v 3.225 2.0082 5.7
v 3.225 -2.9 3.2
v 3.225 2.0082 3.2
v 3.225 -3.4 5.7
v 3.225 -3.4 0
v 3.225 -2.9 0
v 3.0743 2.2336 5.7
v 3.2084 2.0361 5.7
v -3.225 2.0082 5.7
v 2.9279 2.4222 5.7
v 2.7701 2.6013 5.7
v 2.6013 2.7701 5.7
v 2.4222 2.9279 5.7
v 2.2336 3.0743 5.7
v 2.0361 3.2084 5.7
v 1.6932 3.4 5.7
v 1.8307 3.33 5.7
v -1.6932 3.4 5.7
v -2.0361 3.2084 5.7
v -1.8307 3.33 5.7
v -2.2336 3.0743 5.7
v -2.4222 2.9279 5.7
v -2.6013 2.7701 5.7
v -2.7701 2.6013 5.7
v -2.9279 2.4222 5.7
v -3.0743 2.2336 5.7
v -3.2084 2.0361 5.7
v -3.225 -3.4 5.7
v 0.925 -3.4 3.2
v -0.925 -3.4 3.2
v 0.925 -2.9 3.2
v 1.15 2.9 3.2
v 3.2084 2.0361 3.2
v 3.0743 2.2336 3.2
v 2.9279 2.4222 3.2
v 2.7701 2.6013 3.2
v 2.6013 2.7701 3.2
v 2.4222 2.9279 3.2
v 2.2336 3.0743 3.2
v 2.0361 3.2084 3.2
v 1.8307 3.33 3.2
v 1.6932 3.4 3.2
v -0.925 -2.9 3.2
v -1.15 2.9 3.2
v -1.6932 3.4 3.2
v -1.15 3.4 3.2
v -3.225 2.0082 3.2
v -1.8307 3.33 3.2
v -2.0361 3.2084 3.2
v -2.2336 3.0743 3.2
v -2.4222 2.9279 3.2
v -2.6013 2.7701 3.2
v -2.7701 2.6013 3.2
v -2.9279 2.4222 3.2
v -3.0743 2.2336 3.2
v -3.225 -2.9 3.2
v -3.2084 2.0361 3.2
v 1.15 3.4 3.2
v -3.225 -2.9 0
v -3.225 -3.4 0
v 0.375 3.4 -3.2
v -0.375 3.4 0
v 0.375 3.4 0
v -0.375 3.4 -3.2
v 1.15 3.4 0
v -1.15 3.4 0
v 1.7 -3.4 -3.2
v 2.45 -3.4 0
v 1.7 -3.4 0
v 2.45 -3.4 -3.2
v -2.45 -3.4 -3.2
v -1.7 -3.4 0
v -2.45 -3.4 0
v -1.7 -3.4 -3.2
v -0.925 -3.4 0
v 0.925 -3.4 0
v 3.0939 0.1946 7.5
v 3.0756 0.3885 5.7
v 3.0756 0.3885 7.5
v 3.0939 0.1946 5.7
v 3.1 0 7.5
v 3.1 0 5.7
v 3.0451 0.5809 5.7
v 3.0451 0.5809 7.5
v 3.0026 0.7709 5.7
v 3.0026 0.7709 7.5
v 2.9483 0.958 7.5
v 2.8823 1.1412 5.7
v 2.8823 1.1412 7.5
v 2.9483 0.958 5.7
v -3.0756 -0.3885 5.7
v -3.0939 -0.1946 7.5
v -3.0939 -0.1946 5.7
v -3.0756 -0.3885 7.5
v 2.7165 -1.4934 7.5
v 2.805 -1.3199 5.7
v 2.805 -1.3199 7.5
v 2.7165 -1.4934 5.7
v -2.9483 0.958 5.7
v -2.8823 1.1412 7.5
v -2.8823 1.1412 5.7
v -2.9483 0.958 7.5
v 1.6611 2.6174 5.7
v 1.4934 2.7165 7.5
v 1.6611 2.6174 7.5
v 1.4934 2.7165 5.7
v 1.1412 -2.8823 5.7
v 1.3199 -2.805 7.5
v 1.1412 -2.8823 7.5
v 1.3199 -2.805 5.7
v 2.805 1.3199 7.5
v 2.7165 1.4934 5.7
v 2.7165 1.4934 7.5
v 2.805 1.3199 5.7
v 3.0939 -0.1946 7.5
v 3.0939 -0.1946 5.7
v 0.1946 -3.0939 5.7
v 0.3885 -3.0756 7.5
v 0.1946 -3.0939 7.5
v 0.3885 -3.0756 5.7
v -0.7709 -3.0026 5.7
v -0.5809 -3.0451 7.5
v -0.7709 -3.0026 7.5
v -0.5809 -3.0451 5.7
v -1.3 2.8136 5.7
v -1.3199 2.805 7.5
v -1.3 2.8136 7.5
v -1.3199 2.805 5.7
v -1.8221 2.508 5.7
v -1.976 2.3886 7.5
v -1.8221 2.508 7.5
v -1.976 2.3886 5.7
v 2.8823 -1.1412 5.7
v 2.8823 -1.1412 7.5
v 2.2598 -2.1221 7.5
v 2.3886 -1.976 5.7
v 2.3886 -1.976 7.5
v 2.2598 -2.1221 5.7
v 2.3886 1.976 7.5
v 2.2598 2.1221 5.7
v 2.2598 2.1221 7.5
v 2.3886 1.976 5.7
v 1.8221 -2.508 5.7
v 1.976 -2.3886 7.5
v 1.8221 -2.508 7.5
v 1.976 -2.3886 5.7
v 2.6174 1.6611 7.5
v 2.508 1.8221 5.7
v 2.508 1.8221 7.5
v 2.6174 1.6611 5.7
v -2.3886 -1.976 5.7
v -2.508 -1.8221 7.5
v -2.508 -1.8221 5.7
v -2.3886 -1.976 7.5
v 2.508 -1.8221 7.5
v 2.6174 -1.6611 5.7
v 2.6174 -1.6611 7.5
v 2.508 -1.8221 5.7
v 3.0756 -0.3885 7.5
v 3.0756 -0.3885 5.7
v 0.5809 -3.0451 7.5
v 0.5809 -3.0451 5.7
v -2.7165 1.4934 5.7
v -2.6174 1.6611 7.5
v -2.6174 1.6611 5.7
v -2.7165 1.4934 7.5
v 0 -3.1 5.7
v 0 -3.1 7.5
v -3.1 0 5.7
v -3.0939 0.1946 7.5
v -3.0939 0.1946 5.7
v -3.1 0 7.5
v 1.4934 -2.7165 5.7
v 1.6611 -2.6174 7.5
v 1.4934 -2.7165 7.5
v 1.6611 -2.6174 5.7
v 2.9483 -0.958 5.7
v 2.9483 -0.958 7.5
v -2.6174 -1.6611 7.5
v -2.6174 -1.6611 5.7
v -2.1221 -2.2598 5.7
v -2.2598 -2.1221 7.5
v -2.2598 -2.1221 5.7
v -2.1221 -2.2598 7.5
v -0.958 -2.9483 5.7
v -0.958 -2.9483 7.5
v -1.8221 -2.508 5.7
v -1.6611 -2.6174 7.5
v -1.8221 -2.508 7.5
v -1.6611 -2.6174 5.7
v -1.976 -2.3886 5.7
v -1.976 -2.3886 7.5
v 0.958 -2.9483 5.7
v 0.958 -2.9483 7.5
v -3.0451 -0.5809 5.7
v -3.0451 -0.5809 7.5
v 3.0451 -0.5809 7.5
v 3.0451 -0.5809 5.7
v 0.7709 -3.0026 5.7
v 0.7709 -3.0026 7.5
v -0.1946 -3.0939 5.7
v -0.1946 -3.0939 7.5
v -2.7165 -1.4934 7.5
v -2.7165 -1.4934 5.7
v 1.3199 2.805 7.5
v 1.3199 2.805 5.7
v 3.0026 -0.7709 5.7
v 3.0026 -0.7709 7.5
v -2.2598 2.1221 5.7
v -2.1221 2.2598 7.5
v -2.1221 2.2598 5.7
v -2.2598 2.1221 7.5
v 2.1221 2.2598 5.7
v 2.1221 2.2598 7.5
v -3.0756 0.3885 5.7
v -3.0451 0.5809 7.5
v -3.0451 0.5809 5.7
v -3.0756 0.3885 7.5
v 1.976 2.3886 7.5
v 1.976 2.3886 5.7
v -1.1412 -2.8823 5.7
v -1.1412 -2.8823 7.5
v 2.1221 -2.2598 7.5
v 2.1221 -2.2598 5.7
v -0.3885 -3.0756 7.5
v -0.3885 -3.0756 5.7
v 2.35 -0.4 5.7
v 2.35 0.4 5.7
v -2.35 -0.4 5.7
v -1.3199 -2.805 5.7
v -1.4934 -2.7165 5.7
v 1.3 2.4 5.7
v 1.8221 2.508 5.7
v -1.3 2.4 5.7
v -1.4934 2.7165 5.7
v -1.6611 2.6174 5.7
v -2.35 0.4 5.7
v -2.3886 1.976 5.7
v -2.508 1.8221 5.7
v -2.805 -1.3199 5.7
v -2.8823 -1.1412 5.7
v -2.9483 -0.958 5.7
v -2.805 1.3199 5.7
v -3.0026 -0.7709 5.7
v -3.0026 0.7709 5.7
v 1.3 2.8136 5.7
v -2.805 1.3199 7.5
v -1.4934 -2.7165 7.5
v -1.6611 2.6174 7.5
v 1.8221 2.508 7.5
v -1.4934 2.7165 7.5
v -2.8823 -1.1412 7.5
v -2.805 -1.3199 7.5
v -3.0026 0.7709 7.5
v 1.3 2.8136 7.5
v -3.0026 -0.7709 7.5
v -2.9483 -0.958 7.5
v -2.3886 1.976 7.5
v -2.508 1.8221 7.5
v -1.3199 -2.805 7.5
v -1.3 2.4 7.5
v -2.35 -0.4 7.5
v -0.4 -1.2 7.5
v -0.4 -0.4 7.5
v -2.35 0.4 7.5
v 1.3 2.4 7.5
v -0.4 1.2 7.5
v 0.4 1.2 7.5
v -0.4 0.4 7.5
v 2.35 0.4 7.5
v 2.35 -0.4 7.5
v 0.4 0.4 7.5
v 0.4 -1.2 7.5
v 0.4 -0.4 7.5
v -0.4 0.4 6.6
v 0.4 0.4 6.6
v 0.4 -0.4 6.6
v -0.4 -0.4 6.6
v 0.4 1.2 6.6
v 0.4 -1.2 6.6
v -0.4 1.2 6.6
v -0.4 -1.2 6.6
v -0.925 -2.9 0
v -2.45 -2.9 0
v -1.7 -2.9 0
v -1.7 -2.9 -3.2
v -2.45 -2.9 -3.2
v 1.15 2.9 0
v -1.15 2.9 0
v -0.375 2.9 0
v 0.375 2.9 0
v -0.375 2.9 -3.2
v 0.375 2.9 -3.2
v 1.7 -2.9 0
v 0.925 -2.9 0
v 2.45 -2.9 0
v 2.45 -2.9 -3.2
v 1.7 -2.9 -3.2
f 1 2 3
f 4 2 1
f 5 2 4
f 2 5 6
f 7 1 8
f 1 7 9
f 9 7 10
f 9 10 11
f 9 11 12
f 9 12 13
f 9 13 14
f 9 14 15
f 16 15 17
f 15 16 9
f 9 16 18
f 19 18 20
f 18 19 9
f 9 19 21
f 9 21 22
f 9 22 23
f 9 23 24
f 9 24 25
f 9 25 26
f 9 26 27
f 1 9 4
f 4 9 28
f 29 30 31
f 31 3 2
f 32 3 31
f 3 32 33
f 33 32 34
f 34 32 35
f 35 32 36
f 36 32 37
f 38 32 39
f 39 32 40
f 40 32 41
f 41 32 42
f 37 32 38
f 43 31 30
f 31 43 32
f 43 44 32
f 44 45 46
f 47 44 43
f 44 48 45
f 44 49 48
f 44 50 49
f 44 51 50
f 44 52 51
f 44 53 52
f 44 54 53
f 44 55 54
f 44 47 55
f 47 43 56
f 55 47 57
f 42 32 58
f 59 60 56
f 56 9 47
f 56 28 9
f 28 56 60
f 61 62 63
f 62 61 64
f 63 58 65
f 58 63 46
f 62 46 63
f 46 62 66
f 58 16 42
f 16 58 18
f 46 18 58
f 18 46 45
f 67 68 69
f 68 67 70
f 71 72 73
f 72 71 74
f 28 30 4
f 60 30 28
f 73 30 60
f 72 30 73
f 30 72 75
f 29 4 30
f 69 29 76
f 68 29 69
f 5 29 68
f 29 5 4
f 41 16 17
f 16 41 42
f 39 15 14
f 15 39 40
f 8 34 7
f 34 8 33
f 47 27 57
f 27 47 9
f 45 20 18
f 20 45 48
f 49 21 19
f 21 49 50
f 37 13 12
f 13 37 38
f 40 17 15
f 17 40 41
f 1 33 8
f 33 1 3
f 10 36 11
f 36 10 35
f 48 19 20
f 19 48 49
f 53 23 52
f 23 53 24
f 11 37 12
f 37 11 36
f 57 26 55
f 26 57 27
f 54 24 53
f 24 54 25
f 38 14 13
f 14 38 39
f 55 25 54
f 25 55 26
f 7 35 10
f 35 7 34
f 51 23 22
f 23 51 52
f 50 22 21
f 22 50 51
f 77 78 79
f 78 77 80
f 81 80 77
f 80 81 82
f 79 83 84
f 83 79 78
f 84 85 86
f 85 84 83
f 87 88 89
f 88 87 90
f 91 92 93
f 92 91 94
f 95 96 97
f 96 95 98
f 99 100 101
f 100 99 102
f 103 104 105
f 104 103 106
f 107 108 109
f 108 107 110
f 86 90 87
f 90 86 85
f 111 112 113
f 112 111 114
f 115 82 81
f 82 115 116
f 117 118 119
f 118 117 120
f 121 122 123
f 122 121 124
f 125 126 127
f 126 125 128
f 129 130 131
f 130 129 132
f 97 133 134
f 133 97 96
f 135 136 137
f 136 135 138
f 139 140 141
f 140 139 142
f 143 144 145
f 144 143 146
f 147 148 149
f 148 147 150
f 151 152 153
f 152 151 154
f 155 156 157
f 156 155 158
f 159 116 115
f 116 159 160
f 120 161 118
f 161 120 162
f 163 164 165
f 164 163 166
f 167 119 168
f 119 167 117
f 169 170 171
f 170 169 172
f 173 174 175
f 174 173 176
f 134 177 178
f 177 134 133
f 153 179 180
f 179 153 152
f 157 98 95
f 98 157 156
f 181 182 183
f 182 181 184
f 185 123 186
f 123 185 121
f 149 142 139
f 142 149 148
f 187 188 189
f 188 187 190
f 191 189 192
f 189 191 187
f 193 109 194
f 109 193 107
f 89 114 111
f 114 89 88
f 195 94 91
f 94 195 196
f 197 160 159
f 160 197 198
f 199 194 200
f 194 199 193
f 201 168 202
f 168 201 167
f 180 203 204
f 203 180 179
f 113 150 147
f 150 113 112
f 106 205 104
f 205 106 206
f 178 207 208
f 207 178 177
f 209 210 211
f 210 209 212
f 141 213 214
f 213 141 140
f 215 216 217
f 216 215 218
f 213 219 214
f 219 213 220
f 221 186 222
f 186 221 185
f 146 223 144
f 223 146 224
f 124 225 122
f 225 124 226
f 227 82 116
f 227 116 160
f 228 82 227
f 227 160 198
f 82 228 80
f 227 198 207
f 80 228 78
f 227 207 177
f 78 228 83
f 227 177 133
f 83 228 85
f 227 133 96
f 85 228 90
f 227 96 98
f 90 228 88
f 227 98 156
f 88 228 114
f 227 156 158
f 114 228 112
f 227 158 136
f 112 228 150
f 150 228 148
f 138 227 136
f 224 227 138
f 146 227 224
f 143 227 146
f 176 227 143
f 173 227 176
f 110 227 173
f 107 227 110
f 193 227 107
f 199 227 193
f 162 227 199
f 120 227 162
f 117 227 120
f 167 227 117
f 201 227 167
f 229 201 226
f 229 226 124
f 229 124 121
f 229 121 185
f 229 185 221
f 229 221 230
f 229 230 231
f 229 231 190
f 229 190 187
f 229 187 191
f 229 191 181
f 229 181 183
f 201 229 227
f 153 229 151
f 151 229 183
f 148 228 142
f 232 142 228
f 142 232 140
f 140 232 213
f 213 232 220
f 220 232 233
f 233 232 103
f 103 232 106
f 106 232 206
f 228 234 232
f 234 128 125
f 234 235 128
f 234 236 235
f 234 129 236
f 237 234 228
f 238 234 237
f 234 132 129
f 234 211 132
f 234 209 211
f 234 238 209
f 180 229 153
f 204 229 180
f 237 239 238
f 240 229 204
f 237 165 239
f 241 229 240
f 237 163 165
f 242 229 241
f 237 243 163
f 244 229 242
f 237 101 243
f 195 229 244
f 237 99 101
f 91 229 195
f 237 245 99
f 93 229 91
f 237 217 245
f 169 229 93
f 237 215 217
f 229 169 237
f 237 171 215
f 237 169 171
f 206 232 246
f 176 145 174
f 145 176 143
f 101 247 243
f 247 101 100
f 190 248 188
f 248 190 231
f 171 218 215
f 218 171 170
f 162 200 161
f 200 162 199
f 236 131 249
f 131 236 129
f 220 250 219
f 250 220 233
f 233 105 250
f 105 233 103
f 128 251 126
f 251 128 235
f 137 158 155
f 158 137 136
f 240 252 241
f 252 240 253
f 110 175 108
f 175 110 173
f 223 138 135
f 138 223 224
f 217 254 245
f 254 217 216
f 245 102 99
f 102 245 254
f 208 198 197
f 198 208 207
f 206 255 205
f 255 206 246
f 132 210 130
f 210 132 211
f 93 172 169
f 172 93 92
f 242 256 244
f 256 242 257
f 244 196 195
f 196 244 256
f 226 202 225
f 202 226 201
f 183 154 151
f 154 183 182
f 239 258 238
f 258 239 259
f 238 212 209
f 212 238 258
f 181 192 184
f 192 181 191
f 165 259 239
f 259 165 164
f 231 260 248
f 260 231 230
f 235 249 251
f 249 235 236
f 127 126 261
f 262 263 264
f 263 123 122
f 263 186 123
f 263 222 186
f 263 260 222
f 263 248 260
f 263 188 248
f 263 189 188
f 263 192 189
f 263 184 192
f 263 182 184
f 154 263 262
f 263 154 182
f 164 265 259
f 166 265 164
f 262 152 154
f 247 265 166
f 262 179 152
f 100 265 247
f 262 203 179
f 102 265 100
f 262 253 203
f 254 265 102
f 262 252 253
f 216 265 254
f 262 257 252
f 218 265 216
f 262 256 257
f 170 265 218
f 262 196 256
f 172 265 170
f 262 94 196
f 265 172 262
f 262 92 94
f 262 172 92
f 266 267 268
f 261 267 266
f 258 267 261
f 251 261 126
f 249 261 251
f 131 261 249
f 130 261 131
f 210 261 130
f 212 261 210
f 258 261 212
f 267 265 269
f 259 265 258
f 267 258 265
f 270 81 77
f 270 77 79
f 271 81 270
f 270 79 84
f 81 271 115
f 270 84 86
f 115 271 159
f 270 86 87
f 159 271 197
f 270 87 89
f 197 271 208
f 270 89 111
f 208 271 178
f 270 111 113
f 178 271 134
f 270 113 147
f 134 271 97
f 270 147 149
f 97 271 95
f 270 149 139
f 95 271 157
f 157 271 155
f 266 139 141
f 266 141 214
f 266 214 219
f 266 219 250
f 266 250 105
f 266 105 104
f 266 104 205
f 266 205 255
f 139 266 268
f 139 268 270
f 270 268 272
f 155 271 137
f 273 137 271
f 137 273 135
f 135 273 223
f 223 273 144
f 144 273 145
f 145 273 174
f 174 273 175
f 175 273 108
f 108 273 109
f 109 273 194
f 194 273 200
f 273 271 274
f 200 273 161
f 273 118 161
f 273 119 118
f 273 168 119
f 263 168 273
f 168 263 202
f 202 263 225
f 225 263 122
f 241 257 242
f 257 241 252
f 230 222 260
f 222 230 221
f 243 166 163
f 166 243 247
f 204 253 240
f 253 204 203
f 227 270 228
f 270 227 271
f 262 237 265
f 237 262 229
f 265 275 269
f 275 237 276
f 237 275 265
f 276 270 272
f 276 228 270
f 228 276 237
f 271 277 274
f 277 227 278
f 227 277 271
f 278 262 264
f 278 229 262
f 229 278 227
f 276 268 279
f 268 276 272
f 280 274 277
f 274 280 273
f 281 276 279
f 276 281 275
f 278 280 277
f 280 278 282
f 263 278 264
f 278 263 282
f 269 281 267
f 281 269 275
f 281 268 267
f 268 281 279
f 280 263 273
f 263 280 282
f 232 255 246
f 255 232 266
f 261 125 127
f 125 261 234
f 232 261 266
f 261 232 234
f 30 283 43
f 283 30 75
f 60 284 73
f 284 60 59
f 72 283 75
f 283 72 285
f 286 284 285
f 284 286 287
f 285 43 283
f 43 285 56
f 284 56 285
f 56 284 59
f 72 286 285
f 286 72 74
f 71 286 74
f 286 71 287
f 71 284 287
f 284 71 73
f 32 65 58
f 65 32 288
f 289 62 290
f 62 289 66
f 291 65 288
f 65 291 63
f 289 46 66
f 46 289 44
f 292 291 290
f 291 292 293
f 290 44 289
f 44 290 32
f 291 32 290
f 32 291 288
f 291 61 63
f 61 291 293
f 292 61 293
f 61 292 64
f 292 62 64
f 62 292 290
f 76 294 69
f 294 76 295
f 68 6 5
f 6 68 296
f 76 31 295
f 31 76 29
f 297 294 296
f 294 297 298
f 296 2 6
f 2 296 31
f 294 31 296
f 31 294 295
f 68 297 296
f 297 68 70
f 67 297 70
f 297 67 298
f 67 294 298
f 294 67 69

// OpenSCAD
$fn = 100;

Body = [6.45, 6.8, 2.5];
Body_Cut_Diameter = 7.6;
Disk_Diameter = 6.2;
Disk_Height = 1.8;
Slit_Width = 0.8;
Slit_Length = 4.7;
Notch_Width = 2.6;
Notch_Depth = 1.0;
Pin_Thickness = 0.5;
Pin_Base_Height = 3.2;
Pin_Base_Width = 2.3;
Pin_Positions = [[-1, -1], [0, 1], [1, -1]];
Pin_Extent_Width = 0.75;
Pin_Extent_Height = 3.2;

e = 0.001;

Trimmer("#CCC", "#00F", "#999");

module Trimmer(disk_color, body_color, metal_color) {
  color(body_color) {
    intersection() {
      translate([-Body[0] / 2, -Body[1] / 2, Pin_Base_Height])
        cube(Body);
      translate([0, 0, Pin_Base_Height])
        cylinder(Body[2], d = Body_Cut_Diameter);
    }

    translate([-Body[0] / 2, -Body[1] / 2, Pin_Base_Height])
      cube([Body[0], Body[1] / 2, Body[2]]);
  }
  color(disk_color)
    translate([0, 0, Pin_Base_Height + Body[2]])
      difference() {
        cylinder(Disk_Height, d = Disk_Diameter);
        translate([-Slit_Length / 2, -Slit_Width / 2, -e / 2])
          cube([Slit_Length, Slit_Width, Disk_Height + e]);
        translate([-Slit_Width / 2, -Slit_Width * 1.5, Disk_Height / 2])
          cube([Slit_Width, Slit_Width * 3, Disk_Height / 2 + e]);
        translate([-Notch_Width / 2, Body[1] / 2 - Notch_Depth, -e / 2])
          cube([Notch_Width, Notch_Depth, Disk_Height + e]);
      }
  color(metal_color)
    for (pos = Pin_Positions) {
      translate([pos[0] * (Body[0] / 2 - Pin_Base_Width / 2),
                 pos[1] * (Body[1] / 2 - Pin_Thickness / 2),
                 Pin_Base_Height / 2])
        cube([Pin_Base_Width, Pin_Thickness, Pin_Base_Height], center = true);
      translate([pos[0] * (Body[0] / 2 - Pin_Base_Width / 2),
                 pos[1] * (Body[1] / 2 - Pin_Thickness / 2),
                 -Pin_Extent_Height / 2])
        cube([Pin_Extent_Width, Pin_Thickness, Pin_Extent_Height], center = true);
    }
}
